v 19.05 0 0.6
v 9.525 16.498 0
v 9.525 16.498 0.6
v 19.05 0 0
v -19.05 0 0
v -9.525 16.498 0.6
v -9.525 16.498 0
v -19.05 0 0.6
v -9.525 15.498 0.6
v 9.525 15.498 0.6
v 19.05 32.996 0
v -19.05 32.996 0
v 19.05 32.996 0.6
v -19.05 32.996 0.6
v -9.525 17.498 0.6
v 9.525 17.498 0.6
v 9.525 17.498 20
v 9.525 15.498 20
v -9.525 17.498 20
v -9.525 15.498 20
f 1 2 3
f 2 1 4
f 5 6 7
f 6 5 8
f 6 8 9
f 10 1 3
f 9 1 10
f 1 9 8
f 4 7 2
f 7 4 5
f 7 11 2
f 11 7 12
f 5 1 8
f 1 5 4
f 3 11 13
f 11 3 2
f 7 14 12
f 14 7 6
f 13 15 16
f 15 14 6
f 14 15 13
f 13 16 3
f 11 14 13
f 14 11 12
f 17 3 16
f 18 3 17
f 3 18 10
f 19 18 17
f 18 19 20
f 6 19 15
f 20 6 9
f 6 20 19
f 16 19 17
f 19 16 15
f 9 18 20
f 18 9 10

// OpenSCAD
function inches(x) = 25.4 * x;

epsilon = 0.001;

hex_side = inches(0.75);
hex_diameter = inches(1.5);

layer_height = 0.2;

module hex(height=3 * layer_height) {
  cylinder(h = height, d = hex_diameter, $fn = 6);
}

module half_hex(height) {
  difference() {
    hex();
    translate([-hex_diameter, -2 * hex_diameter, -epsilon])
      cube([2 * hex_diameter, 2 * hex_diameter, 10]);
  }
}

wall_thickness = 2;

half_hex();
translate([0, hex_diameter * sin(60), 0]) mirror([0,1,0]) half_hex();
translate([-hex_side/2, (hex_diameter * sin(60) - wall_thickness)/2, 0])
  cube([hex_side, wall_thickness, 20]);
